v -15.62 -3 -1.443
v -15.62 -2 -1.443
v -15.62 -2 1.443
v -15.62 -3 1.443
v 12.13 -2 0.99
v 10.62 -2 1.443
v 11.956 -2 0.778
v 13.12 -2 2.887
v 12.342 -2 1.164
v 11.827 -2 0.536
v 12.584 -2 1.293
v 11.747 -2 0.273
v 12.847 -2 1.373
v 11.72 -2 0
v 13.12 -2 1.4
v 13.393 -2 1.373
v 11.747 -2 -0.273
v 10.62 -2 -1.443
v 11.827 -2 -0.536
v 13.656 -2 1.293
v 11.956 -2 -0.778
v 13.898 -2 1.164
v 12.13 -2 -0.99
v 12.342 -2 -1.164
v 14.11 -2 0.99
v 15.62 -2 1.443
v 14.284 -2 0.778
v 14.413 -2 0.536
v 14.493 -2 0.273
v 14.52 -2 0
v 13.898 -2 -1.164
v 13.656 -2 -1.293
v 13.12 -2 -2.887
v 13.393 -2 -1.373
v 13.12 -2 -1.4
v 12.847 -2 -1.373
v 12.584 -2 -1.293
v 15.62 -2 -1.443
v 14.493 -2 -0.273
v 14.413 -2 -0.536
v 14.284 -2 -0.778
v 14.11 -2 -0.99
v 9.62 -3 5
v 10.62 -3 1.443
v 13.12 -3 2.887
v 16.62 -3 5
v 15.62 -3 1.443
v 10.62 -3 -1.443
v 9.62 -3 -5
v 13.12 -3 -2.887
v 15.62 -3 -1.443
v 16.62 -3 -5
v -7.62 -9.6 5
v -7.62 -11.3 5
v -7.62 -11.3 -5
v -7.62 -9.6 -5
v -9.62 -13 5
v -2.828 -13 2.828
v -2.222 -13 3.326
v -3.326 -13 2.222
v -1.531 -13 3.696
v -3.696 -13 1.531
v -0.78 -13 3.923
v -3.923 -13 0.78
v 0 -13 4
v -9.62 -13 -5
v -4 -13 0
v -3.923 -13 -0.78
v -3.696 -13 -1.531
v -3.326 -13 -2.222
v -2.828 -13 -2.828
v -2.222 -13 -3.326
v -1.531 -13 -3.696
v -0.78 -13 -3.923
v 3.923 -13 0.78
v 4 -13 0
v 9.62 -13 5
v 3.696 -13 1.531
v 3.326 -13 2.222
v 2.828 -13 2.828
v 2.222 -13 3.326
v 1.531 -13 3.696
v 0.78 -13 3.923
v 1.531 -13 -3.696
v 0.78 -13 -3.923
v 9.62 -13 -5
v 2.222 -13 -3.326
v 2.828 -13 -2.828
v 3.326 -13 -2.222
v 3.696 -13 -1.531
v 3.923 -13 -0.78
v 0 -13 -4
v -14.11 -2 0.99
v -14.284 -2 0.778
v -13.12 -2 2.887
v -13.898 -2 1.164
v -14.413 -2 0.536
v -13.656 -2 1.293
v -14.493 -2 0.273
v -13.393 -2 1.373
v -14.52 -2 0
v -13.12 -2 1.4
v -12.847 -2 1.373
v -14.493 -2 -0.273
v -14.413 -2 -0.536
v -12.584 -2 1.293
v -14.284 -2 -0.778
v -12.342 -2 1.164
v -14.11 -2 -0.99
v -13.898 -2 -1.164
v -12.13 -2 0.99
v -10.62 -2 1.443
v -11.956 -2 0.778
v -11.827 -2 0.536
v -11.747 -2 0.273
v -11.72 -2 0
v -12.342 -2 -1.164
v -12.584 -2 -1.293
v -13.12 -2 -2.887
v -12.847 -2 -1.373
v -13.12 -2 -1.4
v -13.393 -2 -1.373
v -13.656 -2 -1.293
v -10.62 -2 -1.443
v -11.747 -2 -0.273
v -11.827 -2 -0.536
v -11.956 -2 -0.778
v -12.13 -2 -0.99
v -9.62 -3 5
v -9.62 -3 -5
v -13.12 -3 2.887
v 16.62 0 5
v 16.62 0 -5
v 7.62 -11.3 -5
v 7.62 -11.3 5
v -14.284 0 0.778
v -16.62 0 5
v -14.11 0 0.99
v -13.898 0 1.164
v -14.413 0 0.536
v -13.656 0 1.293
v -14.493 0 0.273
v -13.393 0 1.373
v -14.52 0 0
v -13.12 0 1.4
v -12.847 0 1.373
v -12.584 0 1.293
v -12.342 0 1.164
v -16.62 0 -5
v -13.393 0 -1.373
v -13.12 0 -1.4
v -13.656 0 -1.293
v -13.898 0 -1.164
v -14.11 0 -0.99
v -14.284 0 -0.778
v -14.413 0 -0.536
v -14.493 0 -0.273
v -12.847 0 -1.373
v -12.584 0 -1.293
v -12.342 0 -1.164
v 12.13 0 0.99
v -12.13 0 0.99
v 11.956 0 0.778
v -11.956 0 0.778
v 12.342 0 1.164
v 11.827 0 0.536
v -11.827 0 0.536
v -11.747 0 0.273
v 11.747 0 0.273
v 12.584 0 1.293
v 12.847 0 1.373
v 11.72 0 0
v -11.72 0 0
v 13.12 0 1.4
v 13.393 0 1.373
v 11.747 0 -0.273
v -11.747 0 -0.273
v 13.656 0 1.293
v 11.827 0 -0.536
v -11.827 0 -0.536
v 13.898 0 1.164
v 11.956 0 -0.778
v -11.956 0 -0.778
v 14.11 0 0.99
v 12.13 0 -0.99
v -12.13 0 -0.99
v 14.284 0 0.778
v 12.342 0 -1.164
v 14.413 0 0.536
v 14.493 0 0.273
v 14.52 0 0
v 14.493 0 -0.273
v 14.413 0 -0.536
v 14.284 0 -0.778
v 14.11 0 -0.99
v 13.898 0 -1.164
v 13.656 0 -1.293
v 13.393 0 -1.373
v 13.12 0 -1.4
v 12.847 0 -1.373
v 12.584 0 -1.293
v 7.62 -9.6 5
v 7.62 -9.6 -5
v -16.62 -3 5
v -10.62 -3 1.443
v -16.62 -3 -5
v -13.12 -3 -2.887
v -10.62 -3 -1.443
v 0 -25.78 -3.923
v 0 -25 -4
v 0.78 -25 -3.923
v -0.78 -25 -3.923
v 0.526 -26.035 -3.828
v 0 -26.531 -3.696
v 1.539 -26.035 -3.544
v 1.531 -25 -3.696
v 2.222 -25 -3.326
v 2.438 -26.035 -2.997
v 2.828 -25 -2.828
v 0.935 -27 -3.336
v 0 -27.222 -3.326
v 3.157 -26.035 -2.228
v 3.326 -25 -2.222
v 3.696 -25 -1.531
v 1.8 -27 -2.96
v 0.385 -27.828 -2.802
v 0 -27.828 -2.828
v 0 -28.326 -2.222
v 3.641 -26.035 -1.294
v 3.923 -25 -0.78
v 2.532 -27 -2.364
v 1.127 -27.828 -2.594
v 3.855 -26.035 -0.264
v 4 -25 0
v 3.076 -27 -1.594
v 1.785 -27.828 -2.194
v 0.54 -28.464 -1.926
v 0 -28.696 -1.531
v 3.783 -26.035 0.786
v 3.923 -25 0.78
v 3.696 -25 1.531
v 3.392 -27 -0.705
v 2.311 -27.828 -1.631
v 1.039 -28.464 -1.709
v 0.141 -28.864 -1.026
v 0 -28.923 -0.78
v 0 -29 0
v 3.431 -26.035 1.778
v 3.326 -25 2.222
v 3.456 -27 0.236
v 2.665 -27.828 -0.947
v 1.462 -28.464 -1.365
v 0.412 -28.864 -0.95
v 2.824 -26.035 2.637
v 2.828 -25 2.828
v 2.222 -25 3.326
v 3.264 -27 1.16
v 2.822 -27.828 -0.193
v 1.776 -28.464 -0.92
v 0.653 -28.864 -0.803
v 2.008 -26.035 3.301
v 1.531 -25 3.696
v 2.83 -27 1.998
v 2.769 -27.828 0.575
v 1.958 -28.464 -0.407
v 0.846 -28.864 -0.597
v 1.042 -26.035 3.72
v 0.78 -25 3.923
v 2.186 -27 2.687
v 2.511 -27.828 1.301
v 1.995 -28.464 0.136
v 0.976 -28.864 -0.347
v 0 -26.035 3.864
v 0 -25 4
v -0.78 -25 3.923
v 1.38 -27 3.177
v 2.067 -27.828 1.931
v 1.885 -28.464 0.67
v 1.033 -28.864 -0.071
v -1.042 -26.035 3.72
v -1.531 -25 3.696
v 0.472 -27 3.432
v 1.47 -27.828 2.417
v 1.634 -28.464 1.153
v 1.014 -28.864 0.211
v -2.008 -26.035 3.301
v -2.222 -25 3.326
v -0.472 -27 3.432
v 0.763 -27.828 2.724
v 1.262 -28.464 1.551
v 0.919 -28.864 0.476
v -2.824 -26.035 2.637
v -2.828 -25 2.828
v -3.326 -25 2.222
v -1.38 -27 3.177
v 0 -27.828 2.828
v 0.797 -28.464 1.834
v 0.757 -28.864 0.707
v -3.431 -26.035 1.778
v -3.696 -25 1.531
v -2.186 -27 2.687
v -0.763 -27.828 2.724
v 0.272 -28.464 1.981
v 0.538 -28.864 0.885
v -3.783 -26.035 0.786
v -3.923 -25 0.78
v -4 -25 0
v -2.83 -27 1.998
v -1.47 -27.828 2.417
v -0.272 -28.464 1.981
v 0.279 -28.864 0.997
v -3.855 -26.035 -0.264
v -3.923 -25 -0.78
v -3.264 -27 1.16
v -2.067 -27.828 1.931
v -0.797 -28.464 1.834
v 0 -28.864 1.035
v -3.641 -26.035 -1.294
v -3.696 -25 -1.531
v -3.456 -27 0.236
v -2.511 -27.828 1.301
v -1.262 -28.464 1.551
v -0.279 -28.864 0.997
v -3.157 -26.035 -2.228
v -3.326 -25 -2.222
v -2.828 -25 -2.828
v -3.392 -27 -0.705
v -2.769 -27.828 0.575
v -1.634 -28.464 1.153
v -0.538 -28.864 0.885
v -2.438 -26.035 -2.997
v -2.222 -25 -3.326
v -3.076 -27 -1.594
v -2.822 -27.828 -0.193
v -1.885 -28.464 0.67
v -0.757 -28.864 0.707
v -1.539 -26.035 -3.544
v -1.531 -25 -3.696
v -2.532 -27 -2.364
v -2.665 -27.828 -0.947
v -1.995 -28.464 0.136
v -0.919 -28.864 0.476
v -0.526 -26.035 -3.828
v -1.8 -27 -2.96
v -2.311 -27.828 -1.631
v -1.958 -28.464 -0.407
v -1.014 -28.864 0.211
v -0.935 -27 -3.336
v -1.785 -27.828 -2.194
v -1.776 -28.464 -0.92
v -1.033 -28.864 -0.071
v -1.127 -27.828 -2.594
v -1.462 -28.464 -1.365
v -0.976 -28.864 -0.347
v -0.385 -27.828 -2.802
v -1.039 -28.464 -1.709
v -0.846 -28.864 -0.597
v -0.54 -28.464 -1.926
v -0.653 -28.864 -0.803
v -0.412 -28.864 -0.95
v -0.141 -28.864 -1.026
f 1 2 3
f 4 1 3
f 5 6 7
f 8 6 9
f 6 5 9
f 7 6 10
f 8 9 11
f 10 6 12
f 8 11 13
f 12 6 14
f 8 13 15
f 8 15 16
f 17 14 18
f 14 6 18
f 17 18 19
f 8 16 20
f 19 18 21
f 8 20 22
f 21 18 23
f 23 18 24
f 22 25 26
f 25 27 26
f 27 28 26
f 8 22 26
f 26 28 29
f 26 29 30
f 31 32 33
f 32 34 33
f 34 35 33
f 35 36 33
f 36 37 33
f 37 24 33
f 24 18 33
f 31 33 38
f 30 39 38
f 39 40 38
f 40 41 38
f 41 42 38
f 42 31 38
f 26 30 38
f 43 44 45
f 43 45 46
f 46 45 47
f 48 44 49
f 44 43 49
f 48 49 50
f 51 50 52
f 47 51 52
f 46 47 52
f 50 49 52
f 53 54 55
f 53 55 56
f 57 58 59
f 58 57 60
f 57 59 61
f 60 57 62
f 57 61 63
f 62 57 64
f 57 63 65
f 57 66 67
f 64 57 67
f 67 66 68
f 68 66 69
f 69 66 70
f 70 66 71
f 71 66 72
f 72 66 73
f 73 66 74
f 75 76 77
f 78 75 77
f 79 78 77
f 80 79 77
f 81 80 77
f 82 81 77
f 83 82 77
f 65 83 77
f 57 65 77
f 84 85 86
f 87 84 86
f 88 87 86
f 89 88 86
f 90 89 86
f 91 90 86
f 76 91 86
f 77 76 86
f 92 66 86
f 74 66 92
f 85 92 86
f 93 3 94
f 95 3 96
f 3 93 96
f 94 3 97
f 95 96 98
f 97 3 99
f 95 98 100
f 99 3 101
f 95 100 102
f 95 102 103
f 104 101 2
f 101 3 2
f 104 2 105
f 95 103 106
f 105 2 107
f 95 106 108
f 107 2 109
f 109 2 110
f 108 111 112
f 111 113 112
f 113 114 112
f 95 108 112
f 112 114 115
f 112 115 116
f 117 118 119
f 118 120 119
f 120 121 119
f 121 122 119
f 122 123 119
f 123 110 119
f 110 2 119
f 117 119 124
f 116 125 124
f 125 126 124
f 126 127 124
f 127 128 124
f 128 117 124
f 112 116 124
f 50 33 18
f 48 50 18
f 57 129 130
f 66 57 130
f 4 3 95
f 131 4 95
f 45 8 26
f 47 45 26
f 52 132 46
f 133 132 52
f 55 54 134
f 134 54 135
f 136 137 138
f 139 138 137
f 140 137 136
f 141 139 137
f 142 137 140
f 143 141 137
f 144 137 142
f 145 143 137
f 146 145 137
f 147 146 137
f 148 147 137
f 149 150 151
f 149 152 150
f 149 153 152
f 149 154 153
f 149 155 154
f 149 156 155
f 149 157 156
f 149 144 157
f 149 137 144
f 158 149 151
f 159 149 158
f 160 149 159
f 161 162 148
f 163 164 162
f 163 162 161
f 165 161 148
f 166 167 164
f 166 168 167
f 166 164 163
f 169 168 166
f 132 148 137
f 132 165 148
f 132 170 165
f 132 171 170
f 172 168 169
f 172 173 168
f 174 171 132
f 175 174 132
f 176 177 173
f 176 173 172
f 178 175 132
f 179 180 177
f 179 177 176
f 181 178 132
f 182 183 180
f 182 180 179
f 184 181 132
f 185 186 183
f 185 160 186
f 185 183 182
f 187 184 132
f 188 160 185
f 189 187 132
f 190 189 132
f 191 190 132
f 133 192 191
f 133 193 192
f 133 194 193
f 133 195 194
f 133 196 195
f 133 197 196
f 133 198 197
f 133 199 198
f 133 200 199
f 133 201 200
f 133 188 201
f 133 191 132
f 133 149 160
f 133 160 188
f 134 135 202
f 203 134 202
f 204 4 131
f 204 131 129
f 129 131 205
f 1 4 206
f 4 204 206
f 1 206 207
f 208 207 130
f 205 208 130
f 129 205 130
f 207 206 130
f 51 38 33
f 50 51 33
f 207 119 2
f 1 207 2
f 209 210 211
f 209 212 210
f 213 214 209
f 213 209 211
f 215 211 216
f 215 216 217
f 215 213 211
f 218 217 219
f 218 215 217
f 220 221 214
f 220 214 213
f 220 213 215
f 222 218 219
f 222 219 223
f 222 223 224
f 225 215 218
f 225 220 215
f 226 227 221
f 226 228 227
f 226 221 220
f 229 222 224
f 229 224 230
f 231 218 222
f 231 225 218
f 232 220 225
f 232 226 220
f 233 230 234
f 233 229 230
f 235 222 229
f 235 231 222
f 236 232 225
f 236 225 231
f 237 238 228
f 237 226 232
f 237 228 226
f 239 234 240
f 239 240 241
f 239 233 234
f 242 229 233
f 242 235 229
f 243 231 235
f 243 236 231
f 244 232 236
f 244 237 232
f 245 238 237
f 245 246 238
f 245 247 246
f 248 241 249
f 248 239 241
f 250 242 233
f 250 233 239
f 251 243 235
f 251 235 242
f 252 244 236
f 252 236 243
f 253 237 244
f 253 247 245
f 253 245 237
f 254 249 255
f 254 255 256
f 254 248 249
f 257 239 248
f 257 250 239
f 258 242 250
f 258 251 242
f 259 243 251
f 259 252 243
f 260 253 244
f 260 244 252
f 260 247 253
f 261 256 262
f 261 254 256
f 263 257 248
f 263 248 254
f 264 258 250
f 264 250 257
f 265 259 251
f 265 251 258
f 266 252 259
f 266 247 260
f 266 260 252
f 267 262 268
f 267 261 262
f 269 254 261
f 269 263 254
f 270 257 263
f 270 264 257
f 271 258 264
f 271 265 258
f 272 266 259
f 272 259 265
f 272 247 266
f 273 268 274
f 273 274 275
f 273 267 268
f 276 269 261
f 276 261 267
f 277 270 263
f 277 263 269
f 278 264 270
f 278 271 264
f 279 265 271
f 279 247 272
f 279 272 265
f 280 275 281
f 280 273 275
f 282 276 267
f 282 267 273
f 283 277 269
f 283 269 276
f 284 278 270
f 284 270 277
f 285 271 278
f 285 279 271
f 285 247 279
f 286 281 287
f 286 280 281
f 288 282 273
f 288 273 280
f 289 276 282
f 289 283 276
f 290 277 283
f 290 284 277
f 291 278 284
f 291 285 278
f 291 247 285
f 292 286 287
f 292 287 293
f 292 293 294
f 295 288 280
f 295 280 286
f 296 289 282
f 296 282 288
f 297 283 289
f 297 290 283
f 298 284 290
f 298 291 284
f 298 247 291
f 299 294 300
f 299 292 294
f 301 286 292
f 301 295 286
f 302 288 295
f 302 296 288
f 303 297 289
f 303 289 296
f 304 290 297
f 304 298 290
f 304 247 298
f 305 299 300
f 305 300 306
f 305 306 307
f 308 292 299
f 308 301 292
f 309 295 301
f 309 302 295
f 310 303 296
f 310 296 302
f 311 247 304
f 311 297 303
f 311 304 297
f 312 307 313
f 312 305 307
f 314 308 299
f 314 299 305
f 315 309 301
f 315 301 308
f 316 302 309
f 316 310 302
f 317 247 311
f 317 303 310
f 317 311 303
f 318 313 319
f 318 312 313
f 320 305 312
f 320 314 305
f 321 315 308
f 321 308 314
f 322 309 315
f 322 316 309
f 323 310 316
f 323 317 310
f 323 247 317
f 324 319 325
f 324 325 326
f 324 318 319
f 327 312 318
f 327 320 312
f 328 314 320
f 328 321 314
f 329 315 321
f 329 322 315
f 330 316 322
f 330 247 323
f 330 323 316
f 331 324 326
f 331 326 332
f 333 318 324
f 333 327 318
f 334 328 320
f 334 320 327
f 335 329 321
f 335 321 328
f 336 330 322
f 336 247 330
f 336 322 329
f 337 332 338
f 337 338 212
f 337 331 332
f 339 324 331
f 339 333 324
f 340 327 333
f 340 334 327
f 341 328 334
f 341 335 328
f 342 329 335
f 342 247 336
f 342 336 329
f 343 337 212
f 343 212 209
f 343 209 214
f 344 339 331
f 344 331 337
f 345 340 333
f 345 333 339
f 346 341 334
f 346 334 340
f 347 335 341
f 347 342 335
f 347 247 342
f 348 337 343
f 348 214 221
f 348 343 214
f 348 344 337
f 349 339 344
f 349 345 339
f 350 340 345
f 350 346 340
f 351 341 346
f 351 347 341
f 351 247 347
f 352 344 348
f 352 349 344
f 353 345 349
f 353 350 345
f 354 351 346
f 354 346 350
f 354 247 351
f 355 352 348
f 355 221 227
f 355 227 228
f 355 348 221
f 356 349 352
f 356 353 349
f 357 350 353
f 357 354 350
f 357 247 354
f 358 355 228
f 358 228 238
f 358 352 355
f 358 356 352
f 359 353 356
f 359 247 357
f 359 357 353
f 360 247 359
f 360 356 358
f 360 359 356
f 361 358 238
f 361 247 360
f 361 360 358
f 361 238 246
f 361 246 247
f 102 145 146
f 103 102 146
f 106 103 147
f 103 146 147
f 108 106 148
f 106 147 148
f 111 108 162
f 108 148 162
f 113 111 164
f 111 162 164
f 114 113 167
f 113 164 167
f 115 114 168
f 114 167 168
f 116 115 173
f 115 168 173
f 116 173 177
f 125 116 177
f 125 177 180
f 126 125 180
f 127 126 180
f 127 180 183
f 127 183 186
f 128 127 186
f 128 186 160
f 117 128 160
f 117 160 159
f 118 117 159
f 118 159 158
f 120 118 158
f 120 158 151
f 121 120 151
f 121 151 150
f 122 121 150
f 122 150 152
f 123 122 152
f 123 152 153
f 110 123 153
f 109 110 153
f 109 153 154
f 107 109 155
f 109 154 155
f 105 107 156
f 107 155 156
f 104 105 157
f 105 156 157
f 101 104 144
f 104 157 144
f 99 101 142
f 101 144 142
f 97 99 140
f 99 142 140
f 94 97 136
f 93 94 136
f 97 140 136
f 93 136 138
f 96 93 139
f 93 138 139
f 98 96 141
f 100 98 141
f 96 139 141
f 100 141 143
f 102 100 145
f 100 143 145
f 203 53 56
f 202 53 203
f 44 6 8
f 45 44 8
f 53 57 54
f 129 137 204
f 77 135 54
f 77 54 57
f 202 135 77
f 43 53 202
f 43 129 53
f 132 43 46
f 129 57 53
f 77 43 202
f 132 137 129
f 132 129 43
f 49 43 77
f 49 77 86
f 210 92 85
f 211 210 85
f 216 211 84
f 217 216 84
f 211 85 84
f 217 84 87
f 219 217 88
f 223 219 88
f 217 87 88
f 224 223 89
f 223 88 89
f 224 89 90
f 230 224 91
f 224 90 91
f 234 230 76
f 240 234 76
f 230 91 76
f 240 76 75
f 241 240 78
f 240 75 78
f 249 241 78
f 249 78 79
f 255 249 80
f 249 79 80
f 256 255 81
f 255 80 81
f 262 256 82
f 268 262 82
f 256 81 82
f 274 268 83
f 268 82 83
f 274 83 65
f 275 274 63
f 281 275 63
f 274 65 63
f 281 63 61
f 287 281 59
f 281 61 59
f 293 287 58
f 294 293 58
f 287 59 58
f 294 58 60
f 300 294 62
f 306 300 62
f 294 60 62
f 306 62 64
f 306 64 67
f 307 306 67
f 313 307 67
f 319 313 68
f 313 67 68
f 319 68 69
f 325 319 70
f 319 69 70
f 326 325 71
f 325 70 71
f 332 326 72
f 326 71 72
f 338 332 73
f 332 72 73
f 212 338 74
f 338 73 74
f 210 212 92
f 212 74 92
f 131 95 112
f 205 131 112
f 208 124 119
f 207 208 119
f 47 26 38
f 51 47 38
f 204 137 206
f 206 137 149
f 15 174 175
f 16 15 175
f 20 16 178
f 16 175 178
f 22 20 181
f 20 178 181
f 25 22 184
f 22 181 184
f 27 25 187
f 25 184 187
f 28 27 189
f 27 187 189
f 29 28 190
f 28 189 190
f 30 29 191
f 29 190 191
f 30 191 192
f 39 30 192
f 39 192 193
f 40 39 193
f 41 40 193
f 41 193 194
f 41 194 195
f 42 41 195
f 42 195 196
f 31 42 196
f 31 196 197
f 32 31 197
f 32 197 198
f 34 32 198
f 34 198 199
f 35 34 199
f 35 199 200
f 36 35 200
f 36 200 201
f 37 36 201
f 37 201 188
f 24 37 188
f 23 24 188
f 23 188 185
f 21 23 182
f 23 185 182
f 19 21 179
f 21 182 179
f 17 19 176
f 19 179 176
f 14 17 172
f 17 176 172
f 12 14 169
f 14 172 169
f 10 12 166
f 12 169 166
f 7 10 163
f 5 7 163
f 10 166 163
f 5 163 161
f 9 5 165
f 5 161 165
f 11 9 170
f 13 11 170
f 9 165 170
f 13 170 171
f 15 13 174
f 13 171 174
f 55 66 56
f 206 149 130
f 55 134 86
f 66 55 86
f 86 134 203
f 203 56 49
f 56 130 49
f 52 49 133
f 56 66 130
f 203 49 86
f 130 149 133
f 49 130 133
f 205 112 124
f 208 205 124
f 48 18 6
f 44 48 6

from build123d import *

# Parameters (mm, degrees)
SKETCH1_W             = 7
SKETCH1_H             = 10
BOSS_EXTRUDE1_DEPTH   = 3
BOSS_EXTRUDE1_2_DEPTH = 3
SKETCH1_4_W           = 19.24
SKETCH1_4_H           = 10
BOSS_EXTRUDE2_DEPTH   = 13
SKETCH2_W             = 15.24
SKETCH2_H             = 1.7
CUT_EXTRUDE1_DEPTH    = 14
SKETCH3_R             = 4
BOSS_EXTRUDE3_DEPTH   = 16
FILLET1_R             = 4
CUT_EXTRUDE2_REACH    = 35.797
SKETCH4_R             = 1.4
CUT_EXTRUDE3_REACH    = 37.797
CUT_EXTRUDE3_START    = -2
SKETCH4_3_R           = 1.4


with BuildPart() as part:
    # Sketch1 → Boss-Extrude1 (new body)
    with BuildSketch(Plane(origin=(0, 0, 0), x_dir=(1, 0, 0), z_dir=(0, 1, 0))):
        with Locations((-13.12, 0)):
            Rectangle(SKETCH1_W, SKETCH1_H)
    extrude(amount=-BOSS_EXTRUDE1_DEPTH)



with BuildPart() as body_2:
    # Sketch1 → Boss-Extrude1 2 (new body)
    with BuildSketch(Plane(origin=(0, 0, 0), x_dir=(1, 0, 0), z_dir=(0, 1, 0))):
        with Locations((13.12, 0)):
            Rectangle(SKETCH1_W, SKETCH1_H)
    extrude(amount=-BOSS_EXTRUDE1_2_DEPTH)


with BuildPart() as part_1:
    add(part.part)

    add(body_2.part)  # Boss-Extrude2 merges body 2
    # Sketch1<4> → Boss-Extrude2 (add)
    with BuildSketch(Plane(origin=(0, 0, 0), x_dir=(1, 0, 0), z_dir=(0, 1, 0))):
        Rectangle(SKETCH1_4_W, SKETCH1_4_H)
    extrude(amount=-BOSS_EXTRUDE2_DEPTH)

    # Sketch2 → Cut-Extrude1 (cut)
    with BuildSketch(Plane.XY.offset(5)):
        with Locations((0, -10.45)):
            Rectangle(SKETCH2_W, SKETCH2_H)
    extrude(amount=-CUT_EXTRUDE1_DEPTH, mode=Mode.SUBTRACT)

    # Sketch3 → Boss-Extrude3 (add)
    with BuildSketch(Plane.XZ.offset(13)):
        Circle(SKETCH3_R)
    extrude(amount=BOSS_EXTRUDE3_DEPTH)

    # Fillet1
    fillet1_edges = [part_1.edges().sort_by_distance(p)[0] for p in [
        (-4, -29, 0),
    ]]
    fillet(fillet1_edges, radius=FILLET1_R)

    # Sketch4 → Cut-Extrude2 (cut, up to next)
    with BuildSketch(Plane(origin=(0, 0, 0), x_dir=(1, 0, 0), z_dir=(0, 1, 0)), mode=Mode.PRIVATE) as cut_extrude2_sk1:
        with Locations((-13.12, 0)):
            Circle(SKETCH4_R)
    cut_extrude2_tool1 = extrude(cut_extrude2_sk1.sketch, amount=-CUT_EXTRUDE2_REACH, mode=Mode.PRIVATE) & part_1.part
    # Sketch4 → Cut-Extrude2 (cut, up to next)
    with BuildSketch(Plane(origin=(0, 0, 0), x_dir=(1, 0, 0), z_dir=(0, 1, 0)), mode=Mode.PRIVATE) as cut_extrude2_sk2:
        with Locations((13.12, 0)):
            Circle(SKETCH4_R)
    cut_extrude2_tool2 = extrude(cut_extrude2_sk2.sketch, amount=-CUT_EXTRUDE2_REACH, mode=Mode.PRIVATE) & part_1.part
    add(cut_extrude2_tool1.solids().sort_by_distance((-13.12, 0, 0))[0], mode=Mode.SUBTRACT)
    add(cut_extrude2_tool2.solids().sort_by_distance((13.12, 0, 0))[0], mode=Mode.SUBTRACT)

    # Sketch4<3> → Cut-Extrude3 (cut, up to next)
    with BuildSketch(Plane(origin=(0, 0, 0), x_dir=(1, 0, 0), z_dir=(0, 1, 0)).offset(CUT_EXTRUDE3_START), mode=Mode.PRIVATE) as cut_extrude3_sk1:
        Polygon((-15.62, 1.443375673), (-15.62, -1.443375673), (-13.12, -2.886751346), (-10.62, -1.443375673), (-10.62, 1.443375673), (-13.12, 2.886751346), align=None)
        with Locations((-13.12, 0)):
            Circle(SKETCH4_3_R, mode=Mode.SUBTRACT)
    cut_extrude3_tool1 = extrude(cut_extrude3_sk1.sketch, amount=-CUT_EXTRUDE3_REACH, mode=Mode.PRIVATE) & part_1.part
    # Sketch4<3> → Cut-Extrude3 (cut, up to next)
    with BuildSketch(Plane(origin=(0, 0, 0), x_dir=(1, 0, 0), z_dir=(0, 1, 0)).offset(CUT_EXTRUDE3_START), mode=Mode.PRIVATE) as cut_extrude3_sk2:
        Polygon((10.62, 1.443375673), (10.62, -1.443375673), (13.12, -2.886751346), (15.62, -1.443375673), (15.62, 1.443375673), (13.12, 2.886751346), align=None)
        with Locations((13.12, 0)):
            Circle(SKETCH4_3_R, mode=Mode.SUBTRACT)
    cut_extrude3_tool2 = extrude(cut_extrude3_sk2.sketch, amount=-CUT_EXTRUDE3_REACH, mode=Mode.PRIVATE) & part_1.part
    add(cut_extrude3_tool1.solids().sort_by_distance((-15.543624, -2, 0))[0], mode=Mode.SUBTRACT)
    add(cut_extrude3_tool2.solids().sort_by_distance((10.696376, -2, 0))[0], mode=Mode.SUBTRACT)


solid = part_1.part
